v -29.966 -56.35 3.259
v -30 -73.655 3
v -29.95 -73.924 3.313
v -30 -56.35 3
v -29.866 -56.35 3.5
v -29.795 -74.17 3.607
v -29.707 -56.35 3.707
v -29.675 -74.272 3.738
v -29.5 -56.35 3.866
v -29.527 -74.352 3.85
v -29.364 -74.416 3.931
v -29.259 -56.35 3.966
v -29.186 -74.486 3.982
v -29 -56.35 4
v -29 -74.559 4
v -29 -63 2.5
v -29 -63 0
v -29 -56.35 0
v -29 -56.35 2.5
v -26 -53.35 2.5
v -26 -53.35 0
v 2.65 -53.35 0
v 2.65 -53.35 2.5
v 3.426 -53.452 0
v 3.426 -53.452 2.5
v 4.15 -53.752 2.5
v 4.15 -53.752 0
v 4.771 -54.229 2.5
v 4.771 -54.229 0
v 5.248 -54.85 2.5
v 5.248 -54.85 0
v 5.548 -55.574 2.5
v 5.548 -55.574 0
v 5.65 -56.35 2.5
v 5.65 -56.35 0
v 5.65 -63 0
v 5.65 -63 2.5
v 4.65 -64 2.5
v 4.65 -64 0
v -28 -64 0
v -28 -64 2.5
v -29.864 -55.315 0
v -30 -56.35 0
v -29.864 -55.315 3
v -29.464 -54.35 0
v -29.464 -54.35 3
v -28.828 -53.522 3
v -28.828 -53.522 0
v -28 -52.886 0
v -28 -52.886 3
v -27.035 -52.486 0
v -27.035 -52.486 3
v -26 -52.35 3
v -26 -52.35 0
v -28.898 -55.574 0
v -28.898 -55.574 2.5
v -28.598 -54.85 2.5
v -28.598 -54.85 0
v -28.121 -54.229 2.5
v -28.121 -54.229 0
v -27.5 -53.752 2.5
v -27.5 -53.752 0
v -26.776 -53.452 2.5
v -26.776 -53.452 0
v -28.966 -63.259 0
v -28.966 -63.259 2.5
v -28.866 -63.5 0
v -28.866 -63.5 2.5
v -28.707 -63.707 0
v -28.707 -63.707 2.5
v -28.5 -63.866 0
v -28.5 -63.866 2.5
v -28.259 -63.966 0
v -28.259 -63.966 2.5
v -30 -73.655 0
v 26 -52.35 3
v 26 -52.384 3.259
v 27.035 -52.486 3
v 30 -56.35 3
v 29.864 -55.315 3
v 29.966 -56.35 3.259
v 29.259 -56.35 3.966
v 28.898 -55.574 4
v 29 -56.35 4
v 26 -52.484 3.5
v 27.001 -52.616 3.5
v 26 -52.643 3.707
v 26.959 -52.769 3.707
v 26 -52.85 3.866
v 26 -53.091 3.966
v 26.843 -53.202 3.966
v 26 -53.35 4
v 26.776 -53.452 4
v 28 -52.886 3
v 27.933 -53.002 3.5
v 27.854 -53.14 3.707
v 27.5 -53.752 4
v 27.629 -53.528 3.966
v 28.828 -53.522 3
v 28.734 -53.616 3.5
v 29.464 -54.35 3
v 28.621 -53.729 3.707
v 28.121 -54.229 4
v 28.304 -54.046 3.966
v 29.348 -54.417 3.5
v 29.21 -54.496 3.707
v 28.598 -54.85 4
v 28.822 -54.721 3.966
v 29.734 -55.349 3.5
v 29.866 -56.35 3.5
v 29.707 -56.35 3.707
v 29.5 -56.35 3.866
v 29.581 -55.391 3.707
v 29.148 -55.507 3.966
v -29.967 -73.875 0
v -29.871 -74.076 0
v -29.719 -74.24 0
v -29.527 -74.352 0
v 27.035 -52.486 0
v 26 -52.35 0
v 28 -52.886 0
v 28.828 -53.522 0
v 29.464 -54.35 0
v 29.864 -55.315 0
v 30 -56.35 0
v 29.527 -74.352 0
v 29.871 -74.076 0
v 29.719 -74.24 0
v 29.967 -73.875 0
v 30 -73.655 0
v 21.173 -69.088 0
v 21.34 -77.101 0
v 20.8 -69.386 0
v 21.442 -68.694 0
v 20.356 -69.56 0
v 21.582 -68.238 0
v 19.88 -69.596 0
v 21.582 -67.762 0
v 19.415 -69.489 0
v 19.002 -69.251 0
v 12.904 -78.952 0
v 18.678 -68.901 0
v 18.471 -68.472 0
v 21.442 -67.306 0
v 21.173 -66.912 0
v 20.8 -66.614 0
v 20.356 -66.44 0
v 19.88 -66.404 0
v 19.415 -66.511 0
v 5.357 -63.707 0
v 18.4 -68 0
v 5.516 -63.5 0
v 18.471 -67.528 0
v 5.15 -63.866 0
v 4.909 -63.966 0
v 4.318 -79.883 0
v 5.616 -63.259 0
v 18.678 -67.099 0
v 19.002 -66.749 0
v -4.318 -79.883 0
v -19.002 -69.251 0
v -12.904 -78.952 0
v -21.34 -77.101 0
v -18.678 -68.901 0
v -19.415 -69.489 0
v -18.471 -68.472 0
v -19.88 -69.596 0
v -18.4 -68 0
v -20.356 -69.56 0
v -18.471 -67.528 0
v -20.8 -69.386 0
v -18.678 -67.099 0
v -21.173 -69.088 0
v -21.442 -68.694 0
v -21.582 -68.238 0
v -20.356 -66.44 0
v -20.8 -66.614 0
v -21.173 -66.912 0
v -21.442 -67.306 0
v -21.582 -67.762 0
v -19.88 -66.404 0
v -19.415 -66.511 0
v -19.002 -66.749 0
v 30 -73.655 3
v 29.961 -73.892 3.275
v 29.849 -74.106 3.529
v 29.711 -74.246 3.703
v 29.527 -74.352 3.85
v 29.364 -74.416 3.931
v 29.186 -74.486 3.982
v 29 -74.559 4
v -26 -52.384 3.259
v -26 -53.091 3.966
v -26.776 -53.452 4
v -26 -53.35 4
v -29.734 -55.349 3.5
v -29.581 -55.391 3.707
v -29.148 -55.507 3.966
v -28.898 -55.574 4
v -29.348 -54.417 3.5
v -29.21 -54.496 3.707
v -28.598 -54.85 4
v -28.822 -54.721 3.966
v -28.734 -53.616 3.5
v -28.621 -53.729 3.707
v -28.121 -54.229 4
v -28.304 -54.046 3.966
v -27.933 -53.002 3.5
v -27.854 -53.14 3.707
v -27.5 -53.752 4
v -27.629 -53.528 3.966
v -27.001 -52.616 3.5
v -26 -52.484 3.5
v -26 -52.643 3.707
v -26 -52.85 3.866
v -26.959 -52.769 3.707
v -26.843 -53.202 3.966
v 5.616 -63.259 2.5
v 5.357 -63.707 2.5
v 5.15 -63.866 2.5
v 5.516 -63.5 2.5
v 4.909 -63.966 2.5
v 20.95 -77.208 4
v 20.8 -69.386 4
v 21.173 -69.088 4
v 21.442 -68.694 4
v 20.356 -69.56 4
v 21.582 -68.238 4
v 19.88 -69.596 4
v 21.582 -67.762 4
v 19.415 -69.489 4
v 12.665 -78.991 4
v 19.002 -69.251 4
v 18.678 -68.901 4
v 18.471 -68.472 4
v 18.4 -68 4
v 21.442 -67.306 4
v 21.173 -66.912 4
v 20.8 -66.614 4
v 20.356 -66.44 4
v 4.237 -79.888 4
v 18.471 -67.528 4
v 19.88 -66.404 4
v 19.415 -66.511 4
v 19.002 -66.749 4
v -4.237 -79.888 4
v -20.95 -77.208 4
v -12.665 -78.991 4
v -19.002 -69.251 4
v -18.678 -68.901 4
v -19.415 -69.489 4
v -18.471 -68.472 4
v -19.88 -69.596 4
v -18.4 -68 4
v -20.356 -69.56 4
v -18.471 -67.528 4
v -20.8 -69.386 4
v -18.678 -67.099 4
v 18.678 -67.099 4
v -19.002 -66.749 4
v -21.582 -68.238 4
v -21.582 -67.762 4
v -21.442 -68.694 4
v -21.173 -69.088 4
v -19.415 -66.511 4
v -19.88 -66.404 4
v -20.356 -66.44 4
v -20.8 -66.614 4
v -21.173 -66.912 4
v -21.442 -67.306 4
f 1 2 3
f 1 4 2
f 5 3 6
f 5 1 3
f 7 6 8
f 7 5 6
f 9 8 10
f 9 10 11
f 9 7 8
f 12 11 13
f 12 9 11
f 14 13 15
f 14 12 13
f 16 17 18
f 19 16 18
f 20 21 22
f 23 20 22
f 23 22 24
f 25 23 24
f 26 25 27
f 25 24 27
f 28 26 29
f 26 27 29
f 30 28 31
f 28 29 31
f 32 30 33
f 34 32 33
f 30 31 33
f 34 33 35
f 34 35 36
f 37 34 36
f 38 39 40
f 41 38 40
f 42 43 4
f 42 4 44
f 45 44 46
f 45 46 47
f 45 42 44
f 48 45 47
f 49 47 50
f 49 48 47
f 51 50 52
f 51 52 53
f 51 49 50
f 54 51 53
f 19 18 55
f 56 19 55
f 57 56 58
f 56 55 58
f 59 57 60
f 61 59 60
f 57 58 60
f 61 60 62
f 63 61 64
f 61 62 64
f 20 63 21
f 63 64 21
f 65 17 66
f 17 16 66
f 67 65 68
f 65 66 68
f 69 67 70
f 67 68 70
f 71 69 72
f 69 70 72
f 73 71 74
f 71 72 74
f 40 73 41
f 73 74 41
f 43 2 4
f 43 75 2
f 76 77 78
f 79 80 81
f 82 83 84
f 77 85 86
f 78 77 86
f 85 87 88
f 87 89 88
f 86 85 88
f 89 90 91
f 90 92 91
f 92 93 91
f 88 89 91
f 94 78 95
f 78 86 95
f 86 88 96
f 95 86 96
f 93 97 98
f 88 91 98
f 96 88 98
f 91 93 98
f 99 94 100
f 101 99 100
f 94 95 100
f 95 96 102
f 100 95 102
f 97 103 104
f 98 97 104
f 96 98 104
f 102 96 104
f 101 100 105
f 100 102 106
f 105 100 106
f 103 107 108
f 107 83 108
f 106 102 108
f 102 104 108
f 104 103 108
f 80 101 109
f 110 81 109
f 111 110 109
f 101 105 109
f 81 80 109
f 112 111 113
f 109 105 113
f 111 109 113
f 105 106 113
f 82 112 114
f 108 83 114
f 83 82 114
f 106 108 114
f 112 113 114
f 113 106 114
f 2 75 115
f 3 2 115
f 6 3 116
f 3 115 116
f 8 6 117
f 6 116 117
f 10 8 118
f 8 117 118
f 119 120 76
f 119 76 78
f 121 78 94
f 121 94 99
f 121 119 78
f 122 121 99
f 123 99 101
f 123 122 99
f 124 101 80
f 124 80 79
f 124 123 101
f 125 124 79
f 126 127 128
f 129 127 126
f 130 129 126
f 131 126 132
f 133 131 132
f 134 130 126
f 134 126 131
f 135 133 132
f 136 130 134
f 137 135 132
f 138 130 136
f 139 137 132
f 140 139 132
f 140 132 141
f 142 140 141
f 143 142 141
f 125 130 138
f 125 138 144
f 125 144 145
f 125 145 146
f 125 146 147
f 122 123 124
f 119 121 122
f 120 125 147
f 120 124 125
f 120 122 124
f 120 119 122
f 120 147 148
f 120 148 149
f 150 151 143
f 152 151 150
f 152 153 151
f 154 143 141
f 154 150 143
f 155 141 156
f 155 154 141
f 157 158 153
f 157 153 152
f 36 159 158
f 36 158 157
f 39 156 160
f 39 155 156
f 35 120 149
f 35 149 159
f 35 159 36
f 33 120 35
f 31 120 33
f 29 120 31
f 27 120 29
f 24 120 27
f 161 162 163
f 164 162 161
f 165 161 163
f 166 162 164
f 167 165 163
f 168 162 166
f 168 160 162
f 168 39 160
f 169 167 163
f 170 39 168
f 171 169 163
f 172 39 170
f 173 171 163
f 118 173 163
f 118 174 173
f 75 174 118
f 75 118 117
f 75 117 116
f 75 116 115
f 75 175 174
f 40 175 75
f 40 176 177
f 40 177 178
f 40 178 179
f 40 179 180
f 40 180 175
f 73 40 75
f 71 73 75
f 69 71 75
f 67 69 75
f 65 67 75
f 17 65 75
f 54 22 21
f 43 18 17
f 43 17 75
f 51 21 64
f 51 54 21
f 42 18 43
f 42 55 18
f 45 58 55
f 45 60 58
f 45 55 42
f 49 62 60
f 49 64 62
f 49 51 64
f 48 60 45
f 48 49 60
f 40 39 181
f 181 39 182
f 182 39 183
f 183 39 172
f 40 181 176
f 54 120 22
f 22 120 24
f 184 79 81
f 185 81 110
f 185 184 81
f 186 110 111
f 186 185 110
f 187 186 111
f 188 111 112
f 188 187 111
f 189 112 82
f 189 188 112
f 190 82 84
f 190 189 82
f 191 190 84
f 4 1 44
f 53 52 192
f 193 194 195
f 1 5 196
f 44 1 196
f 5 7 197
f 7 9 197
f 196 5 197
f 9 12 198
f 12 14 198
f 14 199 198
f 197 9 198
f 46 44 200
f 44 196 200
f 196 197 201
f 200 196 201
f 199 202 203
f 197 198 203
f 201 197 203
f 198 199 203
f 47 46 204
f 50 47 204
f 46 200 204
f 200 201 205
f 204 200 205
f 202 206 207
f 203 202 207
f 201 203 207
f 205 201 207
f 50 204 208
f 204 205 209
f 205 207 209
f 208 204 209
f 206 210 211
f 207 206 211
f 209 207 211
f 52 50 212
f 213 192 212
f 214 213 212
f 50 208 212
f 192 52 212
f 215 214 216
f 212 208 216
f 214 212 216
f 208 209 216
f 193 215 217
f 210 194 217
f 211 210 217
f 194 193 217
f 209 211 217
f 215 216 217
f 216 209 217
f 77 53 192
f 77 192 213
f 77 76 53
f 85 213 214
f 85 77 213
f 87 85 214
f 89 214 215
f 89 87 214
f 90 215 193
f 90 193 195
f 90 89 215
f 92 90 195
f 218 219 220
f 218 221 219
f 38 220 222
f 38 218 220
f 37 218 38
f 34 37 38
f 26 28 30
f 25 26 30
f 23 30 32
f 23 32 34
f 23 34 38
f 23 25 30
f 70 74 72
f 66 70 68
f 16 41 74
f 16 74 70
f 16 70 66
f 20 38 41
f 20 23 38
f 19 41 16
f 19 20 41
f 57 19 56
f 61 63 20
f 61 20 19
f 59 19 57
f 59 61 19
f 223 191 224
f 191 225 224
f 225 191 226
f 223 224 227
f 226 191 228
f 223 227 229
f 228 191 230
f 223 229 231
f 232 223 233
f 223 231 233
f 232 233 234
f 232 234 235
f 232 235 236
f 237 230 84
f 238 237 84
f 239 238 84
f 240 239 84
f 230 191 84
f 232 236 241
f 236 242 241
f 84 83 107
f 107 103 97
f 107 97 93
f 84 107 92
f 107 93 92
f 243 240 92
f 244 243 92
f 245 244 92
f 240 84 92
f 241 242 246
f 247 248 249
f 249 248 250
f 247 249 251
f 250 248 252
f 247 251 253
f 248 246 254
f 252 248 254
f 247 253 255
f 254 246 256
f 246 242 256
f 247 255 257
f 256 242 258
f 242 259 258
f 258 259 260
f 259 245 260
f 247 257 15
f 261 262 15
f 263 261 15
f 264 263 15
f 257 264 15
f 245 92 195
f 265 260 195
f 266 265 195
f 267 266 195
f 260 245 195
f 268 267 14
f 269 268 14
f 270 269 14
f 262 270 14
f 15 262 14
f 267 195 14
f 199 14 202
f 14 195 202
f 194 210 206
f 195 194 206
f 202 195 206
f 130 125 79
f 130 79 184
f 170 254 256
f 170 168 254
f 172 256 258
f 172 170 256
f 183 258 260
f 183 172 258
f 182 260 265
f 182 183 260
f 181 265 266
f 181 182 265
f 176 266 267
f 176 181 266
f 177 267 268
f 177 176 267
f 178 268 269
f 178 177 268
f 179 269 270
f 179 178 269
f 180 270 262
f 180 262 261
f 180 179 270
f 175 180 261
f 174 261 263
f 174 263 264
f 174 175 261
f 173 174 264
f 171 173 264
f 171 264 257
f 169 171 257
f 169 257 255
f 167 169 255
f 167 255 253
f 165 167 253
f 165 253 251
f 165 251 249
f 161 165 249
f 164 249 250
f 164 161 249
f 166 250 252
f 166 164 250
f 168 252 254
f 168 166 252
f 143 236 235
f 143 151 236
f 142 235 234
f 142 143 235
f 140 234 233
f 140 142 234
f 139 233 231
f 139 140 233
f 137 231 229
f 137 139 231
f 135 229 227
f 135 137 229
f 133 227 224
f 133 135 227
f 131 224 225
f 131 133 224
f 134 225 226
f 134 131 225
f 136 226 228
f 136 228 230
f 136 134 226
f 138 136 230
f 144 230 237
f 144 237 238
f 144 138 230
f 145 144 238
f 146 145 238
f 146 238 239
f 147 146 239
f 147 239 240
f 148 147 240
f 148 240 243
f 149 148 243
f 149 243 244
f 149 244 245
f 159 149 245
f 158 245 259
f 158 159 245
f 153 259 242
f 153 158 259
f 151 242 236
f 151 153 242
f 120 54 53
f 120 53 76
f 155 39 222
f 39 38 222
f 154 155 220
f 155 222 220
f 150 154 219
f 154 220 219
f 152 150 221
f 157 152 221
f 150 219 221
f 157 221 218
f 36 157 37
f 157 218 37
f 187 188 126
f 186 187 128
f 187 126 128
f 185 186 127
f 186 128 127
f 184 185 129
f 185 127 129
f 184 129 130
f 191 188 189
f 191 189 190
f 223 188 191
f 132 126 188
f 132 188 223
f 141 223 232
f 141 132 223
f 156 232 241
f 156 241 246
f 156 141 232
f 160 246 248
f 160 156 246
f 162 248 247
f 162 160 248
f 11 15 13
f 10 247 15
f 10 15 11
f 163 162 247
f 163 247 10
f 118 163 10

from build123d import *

# Parameters (mm, degrees)
SKETCH_1_R      = 1.6
EXTRUDE_1_DEPTH = 2.5
EXTRUDE_START   = 2.5
SKETCH_1_2_R    = 1.6
EXTRUDE_2_DEPTH = 1.5
FILLET_1_R      = 1
FILLET_2_R      = 1
FILLET_3_R      = 0.75


with BuildPart() as part:
    # Эскиз1 → Бобышка-Вытянуть1 (new body)
    with BuildSketch(Plane.XY):
        with BuildLine():
            Line((-26.000019619, -52.3500154), (26.000019619, -52.3500154))
            ThreePointArc((26.000019619, -52.3500154), (28.828446744, -53.521588275), (30.000019619, -56.3500154))
            Line((30.000019619, -56.3500154), (30.000019619, -74.161976935))
            ThreePointArc((30.000019619, -74.161976935), (0, -80), (-30.000019619, -74.161976935))
            Line((-30.000019619, -74.161976935), (-30.000019619, -56.3500154))
            ThreePointArc((-30.000019619, -56.3500154), (-28.828446744, -53.521588275), (-26.000019619, -52.3500154))
        make_face()
        with Locations((-20, -68)):
            Circle(SKETCH_1_R, mode=Mode.SUBTRACT)
        with Locations(Location((20, -68, 0), (0, 0, 180))):
            Circle(SKETCH_1_R, mode=Mode.SUBTRACT)
        with BuildLine():
            Line((-26.000019619, -53.3500154), (2.649996038, -53.3500154))
            ThreePointArc((2.649996038, -53.3500154), (4.771316381, -54.228695057), (5.649996038, -56.3500154))
            Line((5.649996038, -56.3500154), (5.649996038, -63.999979818))
            Line((5.649996038, -63.999979818), (-29.000019619, -63.999979818))
            Line((-29.000019619, -63.999979818), (-29.000019619, -56.3500154))
            ThreePointArc((-29.000019619, -56.3500154), (-28.121339962, -54.228695057), (-26.000019619, -53.3500154))
        make_face(mode=Mode.SUBTRACT)
    extrude(amount=EXTRUDE_1_DEPTH)

    # Эскиз1<2> → Бобышка-Вытянуть2 (add)
    with BuildSketch(Plane.XY.offset(EXTRUDE_START)):
        with BuildLine():
            Line((-26.000019619, -52.3500154), (26.000019619, -52.3500154))
            ThreePointArc((26.000019619, -52.3500154), (28.828446744, -53.521588275), (30.000019619, -56.3500154))
            Line((30.000019619, -56.3500154), (30.000019619, -74.161976935))
            ThreePointArc((30.000019619, -74.161976935), (0, -80), (-30.000019619, -74.161976935))
            Line((-30.000019619, -74.161976935), (-30.000019619, -56.3500154))
            ThreePointArc((-30.000019619, -56.3500154), (-28.828446744, -53.521588275), (-26.000019619, -52.3500154))
        make_face()
        with Locations((-20, -68)):
            Circle(SKETCH_1_2_R, mode=Mode.SUBTRACT)
        with Locations(Location((20, -68, 0), (0, 0, 180))):
            Circle(SKETCH_1_2_R, mode=Mode.SUBTRACT)
    extrude(amount=EXTRUDE_2_DEPTH)

    # Скругление1
    fillet_1_edges = [part.edges().sort_by_distance(p)[0] for p in [
        (5.649996038, -63.999979818, 1.25),
        (-29.000019619, -63.999979818, 1.25),
    ]]
    fillet(fillet_1_edges, radius=FILLET_1_R)

    # Скругление2
    fillet_2_edges = [part.edges().sort_by_distance(p)[0] for p in [
        (30.000019619, -65.255996167, 4),
        (28.828446744, -53.521588275, 4),
        (0, -52.3500154, 4),
        (-28.828446744, -53.521588275, 4),
        (-30.000019619, -65.255996167, 4),
    ]]
    fillet(fillet_2_edges, radius=FILLET_2_R)

    # Скругление3
    # the kernel refuses this fillet: 0.75 mm, written as the material it takes off along each edge
    with BuildSketch(Plane(origin=(-30.000019619, -74.161976935, -1.274451591), x_dir=(0, 1, 0), z_dir=(0, 0, 1))) as fillet_3_piece_1:
        with BuildLine():
            CenterArc((0.507385413, -0.75), FILLET_3_R, 90, 68.34077611)
            ThreePointArc((-0.189661195, -0.473185934), (-0.095207506, -0.236441895), (0, 0))
            Line((0, 0), (0.507385413, 0))
        make_face()
    extrude(amount=5.548903182, mode=Mode.SUBTRACT)
    with BuildSketch(Plane(origin=(30.000019619, -74.161976935, -1.274451591), x_dir=(-0.9282148055127167, -0.3720447215416308, 0), z_dir=(0, 0, 1))) as fillet_3_piece_2:
        with BuildLine():
            CenterArc((0.50739104, -0.749996193), FILLET_3_R, 89.817447948, 68.34077611)
            Line((-0.188770065, -0.470962652), (0, 0))
            ThreePointArc((0, 0), (0.254890318, 0.000406058), (0.509780636, 0))
        make_face()
    extrude(amount=5.548903182, mode=Mode.SUBTRACT)


solid = part.part
